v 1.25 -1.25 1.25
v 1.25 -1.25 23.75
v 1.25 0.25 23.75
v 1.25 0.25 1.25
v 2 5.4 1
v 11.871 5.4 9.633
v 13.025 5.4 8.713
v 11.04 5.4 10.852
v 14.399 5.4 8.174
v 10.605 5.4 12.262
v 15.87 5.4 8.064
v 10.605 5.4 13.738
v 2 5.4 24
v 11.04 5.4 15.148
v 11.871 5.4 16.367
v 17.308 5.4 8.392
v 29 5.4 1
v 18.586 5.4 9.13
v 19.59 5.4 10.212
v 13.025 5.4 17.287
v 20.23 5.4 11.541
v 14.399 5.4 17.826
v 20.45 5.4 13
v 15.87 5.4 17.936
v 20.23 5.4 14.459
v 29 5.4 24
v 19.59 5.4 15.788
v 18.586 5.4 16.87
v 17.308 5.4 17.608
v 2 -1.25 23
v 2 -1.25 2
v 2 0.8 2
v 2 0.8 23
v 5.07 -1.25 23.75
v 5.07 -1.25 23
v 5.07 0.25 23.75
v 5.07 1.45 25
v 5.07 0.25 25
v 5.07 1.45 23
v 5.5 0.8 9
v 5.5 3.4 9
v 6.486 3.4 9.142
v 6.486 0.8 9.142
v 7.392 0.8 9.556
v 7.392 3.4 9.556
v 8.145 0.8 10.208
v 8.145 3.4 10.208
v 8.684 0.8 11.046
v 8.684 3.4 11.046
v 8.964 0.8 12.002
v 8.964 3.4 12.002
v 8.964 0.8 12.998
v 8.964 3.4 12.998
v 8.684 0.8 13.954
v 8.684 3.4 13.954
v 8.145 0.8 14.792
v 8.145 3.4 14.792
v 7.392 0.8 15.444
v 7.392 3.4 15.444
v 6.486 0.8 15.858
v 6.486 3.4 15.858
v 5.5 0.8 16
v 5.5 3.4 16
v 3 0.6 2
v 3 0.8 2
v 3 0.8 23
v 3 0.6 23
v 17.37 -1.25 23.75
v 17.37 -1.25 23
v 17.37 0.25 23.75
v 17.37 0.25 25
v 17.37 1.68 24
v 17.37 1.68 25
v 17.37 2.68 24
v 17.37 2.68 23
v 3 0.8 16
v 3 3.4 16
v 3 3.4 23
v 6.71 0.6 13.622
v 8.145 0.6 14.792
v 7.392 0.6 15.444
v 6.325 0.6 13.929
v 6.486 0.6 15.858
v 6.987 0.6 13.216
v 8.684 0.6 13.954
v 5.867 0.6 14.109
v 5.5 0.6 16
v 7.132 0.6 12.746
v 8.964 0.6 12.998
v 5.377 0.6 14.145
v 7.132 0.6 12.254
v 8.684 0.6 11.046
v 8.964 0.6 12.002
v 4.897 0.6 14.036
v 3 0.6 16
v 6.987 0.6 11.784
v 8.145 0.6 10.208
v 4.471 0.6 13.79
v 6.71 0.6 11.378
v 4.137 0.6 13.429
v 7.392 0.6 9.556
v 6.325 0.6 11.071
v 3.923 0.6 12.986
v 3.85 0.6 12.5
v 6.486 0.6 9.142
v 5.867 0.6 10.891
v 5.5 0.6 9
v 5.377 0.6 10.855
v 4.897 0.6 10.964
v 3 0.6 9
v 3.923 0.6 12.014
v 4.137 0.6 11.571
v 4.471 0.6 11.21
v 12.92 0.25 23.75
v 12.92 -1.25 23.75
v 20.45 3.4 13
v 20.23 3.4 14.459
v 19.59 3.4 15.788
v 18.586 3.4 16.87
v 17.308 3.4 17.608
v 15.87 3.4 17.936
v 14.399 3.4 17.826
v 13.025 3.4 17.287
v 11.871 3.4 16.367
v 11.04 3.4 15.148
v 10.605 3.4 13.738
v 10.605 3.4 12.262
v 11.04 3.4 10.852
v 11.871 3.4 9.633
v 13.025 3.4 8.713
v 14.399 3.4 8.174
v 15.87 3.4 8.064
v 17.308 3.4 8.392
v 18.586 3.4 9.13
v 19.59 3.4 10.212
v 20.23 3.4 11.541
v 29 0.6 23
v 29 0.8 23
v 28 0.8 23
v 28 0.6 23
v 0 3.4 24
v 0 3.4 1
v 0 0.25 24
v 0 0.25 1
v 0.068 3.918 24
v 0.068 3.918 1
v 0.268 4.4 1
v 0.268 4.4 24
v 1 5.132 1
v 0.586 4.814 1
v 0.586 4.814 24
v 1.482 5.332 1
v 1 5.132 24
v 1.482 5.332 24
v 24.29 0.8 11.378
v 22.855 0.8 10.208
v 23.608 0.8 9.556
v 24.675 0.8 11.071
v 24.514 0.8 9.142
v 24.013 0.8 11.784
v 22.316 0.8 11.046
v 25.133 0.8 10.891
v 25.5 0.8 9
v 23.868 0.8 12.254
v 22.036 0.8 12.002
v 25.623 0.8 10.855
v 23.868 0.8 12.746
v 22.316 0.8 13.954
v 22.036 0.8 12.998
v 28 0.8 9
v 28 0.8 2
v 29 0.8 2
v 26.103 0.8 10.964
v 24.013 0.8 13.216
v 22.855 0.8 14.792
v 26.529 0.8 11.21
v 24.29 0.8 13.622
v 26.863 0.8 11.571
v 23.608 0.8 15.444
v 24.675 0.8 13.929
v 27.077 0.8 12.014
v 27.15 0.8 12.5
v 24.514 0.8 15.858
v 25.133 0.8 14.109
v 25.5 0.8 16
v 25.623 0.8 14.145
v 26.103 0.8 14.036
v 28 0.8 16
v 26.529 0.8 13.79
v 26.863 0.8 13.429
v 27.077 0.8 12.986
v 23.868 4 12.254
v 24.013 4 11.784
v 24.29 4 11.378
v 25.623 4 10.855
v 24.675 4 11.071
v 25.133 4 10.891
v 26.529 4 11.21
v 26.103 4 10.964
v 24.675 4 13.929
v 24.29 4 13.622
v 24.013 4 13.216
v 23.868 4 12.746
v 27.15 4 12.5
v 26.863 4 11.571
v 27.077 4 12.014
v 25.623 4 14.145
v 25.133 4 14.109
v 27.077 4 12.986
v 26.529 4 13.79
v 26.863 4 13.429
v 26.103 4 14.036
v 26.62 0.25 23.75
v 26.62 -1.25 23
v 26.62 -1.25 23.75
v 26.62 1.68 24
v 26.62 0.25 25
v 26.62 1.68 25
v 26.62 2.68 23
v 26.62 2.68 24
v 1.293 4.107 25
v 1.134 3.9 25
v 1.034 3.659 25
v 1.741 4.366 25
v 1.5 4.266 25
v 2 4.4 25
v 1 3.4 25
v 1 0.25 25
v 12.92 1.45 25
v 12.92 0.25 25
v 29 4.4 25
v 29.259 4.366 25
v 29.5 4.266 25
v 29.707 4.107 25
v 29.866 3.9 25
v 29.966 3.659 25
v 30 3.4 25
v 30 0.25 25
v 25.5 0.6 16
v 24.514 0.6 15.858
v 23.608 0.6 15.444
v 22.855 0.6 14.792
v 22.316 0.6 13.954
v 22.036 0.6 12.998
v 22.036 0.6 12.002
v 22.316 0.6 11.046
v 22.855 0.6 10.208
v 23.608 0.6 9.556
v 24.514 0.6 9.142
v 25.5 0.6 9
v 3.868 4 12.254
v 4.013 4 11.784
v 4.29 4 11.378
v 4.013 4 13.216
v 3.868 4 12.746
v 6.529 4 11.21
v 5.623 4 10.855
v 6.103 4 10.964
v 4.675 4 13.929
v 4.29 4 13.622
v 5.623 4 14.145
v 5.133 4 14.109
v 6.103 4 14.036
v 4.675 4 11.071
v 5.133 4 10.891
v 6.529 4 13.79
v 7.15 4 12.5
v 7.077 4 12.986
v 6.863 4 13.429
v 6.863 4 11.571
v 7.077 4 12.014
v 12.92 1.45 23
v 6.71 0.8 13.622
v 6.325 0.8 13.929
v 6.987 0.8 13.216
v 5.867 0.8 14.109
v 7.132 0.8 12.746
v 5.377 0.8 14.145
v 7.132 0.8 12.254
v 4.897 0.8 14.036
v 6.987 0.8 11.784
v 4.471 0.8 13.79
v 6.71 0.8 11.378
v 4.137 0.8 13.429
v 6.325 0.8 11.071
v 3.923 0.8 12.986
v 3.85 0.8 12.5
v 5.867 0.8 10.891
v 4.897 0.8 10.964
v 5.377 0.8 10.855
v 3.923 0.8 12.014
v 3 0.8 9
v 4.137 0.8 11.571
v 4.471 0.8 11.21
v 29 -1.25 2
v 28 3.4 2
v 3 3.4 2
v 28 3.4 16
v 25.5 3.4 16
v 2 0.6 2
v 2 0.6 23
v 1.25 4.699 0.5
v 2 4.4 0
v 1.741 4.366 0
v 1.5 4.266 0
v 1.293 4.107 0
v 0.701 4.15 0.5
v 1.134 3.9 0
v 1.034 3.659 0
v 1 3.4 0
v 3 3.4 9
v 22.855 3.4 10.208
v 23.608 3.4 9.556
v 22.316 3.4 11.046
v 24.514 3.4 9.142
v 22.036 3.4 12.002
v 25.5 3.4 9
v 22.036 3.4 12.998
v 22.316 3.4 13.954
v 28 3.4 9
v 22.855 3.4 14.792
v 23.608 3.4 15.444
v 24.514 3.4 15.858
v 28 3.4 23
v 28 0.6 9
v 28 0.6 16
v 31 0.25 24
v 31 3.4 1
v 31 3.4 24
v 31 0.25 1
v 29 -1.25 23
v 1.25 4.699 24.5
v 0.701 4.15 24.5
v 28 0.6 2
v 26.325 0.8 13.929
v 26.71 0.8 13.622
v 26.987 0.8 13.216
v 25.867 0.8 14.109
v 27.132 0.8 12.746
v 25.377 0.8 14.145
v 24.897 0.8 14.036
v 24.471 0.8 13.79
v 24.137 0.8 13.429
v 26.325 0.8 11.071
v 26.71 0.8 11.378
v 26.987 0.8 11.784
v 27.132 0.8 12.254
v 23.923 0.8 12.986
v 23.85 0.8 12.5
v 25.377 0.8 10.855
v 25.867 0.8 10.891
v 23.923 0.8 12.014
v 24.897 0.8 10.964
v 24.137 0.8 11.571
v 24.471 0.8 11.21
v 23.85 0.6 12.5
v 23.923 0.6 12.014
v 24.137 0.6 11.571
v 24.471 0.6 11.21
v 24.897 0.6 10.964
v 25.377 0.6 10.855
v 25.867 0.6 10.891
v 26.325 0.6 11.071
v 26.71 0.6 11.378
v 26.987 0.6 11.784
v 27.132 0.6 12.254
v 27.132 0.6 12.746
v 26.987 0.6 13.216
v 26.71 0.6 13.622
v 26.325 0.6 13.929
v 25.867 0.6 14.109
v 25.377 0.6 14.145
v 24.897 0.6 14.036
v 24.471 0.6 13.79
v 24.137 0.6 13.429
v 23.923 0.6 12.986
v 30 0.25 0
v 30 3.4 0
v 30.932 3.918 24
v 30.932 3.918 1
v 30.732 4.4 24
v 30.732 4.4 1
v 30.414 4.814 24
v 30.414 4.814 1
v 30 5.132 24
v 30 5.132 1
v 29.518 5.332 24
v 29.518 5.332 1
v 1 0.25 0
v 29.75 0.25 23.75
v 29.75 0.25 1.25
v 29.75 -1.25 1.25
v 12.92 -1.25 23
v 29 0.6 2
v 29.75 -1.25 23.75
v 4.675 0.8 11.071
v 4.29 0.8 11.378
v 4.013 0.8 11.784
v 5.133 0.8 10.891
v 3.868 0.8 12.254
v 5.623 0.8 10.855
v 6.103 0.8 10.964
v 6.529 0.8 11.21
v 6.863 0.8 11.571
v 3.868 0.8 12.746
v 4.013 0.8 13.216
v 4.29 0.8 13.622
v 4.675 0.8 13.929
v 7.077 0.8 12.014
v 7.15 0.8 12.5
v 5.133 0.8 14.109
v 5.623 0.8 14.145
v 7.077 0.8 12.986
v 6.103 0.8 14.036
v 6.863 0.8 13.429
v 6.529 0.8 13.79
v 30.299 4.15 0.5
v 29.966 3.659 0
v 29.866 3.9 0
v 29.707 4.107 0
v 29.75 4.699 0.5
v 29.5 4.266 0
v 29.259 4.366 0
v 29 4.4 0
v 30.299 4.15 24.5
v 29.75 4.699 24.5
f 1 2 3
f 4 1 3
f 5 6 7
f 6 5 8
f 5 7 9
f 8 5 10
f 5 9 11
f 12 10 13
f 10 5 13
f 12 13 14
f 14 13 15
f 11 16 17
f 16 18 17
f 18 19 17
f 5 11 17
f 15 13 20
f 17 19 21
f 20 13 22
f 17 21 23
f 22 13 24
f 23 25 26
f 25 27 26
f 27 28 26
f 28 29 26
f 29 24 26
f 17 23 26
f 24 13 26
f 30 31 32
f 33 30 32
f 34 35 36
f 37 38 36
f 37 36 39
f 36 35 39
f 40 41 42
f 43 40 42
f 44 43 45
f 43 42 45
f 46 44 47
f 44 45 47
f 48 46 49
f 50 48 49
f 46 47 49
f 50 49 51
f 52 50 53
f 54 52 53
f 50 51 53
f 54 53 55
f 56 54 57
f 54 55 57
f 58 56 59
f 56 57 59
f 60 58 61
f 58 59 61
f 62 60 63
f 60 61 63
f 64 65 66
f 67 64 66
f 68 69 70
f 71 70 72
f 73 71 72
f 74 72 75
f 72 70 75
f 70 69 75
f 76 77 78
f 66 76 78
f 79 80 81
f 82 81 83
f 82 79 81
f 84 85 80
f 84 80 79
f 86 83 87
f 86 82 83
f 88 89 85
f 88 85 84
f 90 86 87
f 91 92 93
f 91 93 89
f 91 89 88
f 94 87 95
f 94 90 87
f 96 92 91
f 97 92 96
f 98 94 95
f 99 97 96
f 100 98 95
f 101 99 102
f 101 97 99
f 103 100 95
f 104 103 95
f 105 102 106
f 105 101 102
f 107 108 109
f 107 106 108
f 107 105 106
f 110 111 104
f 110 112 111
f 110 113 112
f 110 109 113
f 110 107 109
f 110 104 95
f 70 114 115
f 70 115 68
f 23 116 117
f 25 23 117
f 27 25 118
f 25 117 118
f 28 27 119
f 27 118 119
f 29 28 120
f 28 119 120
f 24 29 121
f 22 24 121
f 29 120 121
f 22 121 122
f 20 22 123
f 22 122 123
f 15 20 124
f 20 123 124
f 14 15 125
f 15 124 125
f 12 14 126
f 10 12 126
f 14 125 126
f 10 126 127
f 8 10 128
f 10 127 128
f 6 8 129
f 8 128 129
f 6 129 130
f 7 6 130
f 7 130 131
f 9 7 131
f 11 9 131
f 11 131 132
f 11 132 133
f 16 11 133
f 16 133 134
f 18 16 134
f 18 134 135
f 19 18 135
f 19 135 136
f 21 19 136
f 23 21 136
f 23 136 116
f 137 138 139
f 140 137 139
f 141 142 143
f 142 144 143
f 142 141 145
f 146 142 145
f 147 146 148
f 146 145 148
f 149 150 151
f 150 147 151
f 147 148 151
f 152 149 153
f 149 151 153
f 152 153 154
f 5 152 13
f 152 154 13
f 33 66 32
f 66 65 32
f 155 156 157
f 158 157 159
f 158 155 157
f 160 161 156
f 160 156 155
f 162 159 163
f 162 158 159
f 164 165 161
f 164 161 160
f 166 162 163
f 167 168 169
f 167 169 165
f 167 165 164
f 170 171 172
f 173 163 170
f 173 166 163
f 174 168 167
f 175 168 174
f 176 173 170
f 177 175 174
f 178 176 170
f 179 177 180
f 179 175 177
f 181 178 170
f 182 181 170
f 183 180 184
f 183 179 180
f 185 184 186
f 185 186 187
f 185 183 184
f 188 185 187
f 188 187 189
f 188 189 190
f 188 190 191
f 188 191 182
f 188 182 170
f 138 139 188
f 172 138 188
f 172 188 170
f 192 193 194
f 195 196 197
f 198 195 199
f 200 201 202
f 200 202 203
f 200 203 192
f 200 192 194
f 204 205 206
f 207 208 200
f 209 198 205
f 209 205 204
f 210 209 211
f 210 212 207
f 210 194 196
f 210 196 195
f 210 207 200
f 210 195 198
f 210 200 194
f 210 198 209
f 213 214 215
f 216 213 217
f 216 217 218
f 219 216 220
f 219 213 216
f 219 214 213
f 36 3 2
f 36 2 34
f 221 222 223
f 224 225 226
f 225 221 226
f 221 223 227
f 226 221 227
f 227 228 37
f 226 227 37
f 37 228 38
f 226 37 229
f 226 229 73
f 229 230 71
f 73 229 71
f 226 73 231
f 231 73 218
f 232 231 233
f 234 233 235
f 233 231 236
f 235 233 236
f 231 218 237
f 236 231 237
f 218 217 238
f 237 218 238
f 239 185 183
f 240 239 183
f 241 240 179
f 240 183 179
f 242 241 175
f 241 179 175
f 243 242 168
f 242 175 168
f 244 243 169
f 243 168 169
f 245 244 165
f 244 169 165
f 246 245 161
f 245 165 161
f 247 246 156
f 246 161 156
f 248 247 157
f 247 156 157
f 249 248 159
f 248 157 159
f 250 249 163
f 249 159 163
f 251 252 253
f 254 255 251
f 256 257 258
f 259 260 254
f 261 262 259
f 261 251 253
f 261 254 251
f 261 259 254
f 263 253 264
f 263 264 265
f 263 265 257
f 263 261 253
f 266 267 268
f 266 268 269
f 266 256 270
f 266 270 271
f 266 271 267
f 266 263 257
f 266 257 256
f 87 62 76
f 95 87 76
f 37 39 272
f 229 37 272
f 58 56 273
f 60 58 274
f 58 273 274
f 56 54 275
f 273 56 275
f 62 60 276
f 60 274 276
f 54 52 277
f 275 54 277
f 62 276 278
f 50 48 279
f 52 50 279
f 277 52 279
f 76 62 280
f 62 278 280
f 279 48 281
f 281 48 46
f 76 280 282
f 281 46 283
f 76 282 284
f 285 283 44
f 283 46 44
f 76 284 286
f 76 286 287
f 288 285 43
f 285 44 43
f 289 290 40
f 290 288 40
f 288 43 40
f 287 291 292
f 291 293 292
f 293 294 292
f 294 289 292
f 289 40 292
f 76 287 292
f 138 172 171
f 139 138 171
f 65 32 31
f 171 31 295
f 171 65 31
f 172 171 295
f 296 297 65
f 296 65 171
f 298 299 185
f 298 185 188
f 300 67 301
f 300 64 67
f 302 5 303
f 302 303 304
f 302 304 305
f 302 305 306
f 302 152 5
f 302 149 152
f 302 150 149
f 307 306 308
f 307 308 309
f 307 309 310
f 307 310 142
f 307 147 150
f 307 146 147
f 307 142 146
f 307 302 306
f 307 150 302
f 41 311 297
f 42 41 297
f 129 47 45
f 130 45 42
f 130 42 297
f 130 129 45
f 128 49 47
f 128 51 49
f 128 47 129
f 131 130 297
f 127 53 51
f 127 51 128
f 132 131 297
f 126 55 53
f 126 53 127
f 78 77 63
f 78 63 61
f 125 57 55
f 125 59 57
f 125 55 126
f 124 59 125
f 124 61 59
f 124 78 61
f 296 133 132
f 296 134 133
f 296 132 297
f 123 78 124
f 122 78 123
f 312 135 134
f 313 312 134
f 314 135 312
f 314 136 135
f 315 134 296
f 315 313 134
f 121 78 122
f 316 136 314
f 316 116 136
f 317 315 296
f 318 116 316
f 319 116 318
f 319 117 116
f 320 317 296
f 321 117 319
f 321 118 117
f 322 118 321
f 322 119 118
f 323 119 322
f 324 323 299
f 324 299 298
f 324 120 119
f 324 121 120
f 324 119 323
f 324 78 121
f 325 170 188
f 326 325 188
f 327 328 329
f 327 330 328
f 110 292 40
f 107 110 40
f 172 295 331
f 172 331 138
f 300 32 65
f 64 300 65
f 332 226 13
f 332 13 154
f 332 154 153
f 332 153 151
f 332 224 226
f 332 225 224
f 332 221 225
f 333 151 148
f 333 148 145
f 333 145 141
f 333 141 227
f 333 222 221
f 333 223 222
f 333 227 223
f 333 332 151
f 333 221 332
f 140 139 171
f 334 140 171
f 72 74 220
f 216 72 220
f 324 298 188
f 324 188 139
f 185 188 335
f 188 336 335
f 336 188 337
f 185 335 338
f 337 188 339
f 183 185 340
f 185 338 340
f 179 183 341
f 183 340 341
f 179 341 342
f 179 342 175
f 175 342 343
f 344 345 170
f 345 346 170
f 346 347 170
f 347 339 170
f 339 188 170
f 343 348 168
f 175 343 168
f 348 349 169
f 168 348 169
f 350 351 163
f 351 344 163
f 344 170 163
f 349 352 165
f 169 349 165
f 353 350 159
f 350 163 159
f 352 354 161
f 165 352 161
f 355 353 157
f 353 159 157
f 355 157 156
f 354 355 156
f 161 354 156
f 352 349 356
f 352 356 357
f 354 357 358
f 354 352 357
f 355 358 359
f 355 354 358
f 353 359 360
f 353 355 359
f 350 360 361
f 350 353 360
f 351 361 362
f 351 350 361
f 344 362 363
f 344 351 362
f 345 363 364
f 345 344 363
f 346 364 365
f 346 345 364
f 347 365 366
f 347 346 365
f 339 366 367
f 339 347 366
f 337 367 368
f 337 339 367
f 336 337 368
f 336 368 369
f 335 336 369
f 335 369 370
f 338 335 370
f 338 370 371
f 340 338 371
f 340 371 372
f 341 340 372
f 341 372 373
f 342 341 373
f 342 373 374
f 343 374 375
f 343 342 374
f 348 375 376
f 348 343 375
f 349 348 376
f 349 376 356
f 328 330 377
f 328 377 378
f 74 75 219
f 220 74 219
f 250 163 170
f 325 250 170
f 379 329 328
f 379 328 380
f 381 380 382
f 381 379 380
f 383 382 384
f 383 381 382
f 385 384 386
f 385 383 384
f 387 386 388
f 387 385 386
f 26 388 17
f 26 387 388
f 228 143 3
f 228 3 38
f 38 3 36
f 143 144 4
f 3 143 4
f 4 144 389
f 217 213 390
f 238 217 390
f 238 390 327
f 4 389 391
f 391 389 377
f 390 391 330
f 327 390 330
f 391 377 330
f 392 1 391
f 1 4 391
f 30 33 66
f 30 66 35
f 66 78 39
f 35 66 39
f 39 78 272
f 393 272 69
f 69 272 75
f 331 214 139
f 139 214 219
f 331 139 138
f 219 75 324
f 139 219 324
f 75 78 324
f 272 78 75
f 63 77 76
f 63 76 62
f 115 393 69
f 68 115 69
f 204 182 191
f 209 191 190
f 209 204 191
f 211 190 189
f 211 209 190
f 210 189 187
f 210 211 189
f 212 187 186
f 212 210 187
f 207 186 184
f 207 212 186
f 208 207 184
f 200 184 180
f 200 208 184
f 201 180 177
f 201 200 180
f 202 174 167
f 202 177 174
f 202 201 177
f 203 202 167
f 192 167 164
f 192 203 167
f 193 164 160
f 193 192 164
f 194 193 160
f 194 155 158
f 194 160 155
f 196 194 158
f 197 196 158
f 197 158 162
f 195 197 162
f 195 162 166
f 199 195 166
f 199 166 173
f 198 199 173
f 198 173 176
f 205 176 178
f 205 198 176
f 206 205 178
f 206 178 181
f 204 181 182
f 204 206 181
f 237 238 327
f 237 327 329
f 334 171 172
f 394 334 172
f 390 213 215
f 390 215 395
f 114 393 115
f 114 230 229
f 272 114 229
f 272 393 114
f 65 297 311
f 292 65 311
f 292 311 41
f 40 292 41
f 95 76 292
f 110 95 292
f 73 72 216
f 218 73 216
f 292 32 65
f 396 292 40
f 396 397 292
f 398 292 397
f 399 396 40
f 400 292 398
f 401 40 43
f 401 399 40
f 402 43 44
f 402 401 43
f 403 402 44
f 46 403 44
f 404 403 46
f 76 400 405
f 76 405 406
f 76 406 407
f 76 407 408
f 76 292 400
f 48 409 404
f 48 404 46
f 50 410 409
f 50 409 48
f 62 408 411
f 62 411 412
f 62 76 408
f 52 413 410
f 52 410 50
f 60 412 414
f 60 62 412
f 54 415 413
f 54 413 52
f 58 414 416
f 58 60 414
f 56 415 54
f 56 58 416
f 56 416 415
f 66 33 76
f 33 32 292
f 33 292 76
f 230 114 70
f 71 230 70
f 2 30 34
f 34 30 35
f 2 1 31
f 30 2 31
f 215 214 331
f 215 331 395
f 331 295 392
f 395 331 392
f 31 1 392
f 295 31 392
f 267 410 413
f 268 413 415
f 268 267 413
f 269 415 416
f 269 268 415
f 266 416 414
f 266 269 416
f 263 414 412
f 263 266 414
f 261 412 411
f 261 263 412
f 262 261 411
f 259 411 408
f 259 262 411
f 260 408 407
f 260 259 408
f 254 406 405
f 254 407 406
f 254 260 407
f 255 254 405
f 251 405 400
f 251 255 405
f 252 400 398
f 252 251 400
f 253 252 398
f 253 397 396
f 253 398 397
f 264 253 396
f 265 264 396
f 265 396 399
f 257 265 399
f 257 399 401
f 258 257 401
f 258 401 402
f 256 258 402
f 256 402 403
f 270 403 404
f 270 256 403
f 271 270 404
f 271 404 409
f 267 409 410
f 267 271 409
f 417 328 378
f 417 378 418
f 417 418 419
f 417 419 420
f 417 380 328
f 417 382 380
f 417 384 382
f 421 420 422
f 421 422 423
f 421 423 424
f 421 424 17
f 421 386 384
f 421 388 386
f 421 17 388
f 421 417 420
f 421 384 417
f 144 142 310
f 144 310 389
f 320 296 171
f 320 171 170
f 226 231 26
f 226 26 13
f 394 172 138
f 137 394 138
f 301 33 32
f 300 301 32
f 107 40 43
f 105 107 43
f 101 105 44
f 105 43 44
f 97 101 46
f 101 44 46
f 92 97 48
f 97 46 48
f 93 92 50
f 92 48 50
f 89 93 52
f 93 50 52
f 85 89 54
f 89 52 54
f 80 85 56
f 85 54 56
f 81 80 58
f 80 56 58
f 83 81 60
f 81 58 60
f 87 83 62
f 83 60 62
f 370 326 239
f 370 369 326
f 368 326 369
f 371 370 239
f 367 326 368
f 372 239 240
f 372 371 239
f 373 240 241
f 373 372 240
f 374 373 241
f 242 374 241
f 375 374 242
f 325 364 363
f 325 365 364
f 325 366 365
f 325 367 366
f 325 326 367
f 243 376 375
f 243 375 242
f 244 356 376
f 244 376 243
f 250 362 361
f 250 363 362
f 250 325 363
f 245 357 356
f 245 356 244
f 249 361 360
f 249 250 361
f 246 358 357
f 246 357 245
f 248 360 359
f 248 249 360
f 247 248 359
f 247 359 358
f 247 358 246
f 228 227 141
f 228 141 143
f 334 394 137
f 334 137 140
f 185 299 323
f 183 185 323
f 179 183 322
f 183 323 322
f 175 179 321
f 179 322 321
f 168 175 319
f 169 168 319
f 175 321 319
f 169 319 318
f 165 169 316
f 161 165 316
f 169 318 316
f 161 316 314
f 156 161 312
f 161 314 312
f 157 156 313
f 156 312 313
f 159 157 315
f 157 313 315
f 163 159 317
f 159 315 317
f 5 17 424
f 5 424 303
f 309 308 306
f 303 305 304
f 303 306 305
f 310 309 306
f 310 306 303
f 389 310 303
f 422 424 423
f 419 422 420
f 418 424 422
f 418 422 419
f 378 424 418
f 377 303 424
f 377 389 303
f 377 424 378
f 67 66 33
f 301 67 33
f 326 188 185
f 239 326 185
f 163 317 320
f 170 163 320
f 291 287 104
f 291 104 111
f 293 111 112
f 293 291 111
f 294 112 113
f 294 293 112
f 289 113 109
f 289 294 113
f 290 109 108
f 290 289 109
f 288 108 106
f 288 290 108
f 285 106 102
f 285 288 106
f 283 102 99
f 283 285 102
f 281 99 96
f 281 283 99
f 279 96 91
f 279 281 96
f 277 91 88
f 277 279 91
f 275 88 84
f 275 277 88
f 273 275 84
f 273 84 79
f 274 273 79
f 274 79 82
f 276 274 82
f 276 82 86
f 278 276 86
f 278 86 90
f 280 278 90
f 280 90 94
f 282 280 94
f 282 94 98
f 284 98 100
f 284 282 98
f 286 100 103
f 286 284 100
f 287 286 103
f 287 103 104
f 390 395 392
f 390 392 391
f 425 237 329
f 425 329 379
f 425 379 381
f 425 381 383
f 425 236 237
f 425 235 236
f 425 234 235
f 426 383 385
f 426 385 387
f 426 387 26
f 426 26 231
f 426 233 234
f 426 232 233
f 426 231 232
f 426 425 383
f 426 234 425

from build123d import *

# Parameters (mm, degrees)
BOX_W              = 9.25
BOX_H              = 1
BOX_DEPTH          = 1
BOX007_W           = 7.85
BOX007_H           = 2.1
BOX007_DEPTH       = 10
BOX006_W           = 7.85
BOX006_H           = 2.1
BOX006_DEPTH       = 10
BOX008_W           = 9.25
BOX008_H           = 2.55
BOX008_DEPTH       = 10
BOX005_W           = 9.25
BOX005_H           = 2.55
BOX005_DEPTH       = 10
BOX004_W           = 28.5
BOX004_H           = 0.25
BOX004_DEPTH       = 22.5
BOX003_W           = 31
BOX003_H           = 0.25
BOX003_DEPTH       = 25
BOX002_W           = 27
BOX002_H           = 1.25
BOX002_DEPTH       = 21
BOX001_W           = 28.5
BOX001_H           = 1.25
BOX001_DEPTH       = 22.5
CYLINDER_R         = 1.65
CYLINDER_DEPTH     = 3.4
CYLINDER001_R      = 1.65
CYLINDER001_DEPTH  = 3.4
SKETCH_W           = 31
SKETCH_H           = 25
PAD_DEPTH          = 5.4
SKETCH003_W        = 27
SKETCH003_H        = 21
POCKET_DEPTH       = 3.4
SKETCH001_W        = 1
SKETCH001_H        = 21
PAD001_DEPTH       = 2.6
PAD002_DEPTH       = 2.6
SKETCH004_R        = 4.95
POCKET001_DEPTH    = 11
FILLET001_R        = 2
CHAMFER_SIZE       = 1
FACE_R             = 1.65
EXTRUSION_DEPTH    = 0.2
EXTRUSION001_DEPTH = 0.2
FACE004_R          = 1.65
EXTRUSION002_DEPTH = 0.2
EXTRUSION003_DEPTH = 0.2


with BuildPart() as typec_extra_space:
    # Box → Box (new body)
    with BuildSketch(Plane(origin=(17.37, 1.68, 23), x_dir=(1, 0, 0), z_dir=(0, 0, 1))):
        with Locations((4.625, 0.5)):
            Rectangle(BOX_W, BOX_H)
    extrude(amount=BOX_DEPTH)


with BuildPart() as micro_cutout_upper:
    # Box007 → Box007 (new body)
    with BuildSketch(Plane(origin=(5.07, -1.65, 20), x_dir=(1, 0, 0), z_dir=(0, 0, 1))):
        with Locations((3.925, 1.05)):
            Rectangle(BOX007_W, BOX007_H)
    extrude(amount=BOX007_DEPTH)


with BuildPart() as fusion003:
    # Box006 → Box006 (new body)
    with BuildSketch(Plane(origin=(5.07, -0.65, 20), x_dir=(1, 0, 0), z_dir=(0, 0, 1))):
        with Locations((3.925, 1.05)):
            Rectangle(BOX006_W, BOX006_H)
    extrude(amount=BOX006_DEPTH)

    # Fusion003: union Micro_cutout_upper
    add(micro_cutout_upper.part)


with BuildPart() as typec_cutout_upper:
    # Box008 → Box008 (new body)
    with BuildSketch(Plane(origin=(17.37, -1.87, 20), x_dir=(1, 0, 0), z_dir=(0, 0, 1))):
        with Locations((4.625, 1.275)):
            Rectangle(BOX008_W, BOX008_H)
    extrude(amount=BOX008_DEPTH)


with BuildPart() as fusion002:
    # Box005 → Box005 (new body)
    with BuildSketch(Plane(origin=(17.37, -0.87, 20), x_dir=(1, 0, 0), z_dir=(0, 0, 1))):
        with Locations((4.625, 1.275)):
            Rectangle(BOX005_W, BOX005_H)
    extrude(amount=BOX005_DEPTH)

    # Fusion002: union TypeC_cutout_upper
    add(typec_cutout_upper.part)


with BuildPart() as cube004:
    # Box004 → Box004 (new body)
    with BuildSketch(Plane(origin=(1.25, 0, 1.25), x_dir=(1, 0, 0), z_dir=(0, 0, 1))):
        with Locations((14.25, 0.125)):
            Rectangle(BOX004_W, BOX004_H)
    extrude(amount=BOX004_DEPTH)


with BuildPart() as cut002:
    # Box003 → Box003 (new body)
    with BuildSketch(Plane.XY):
        with Locations((15.5, 0.125)):
            Rectangle(BOX003_W, BOX003_H)
    extrude(amount=BOX003_DEPTH)

    # Cut002: cut Cube004
    add(cube004.part, mode=Mode.SUBTRACT)


with BuildPart() as cube002:
    # Box002 → Box002 (new body)
    with BuildSketch(Plane(origin=(2, 0, 2), x_dir=(1, 0, 0), z_dir=(0, 0, 1))):
        with Locations((13.5, 0.625)):
            Rectangle(BOX002_W, BOX002_H)
    extrude(amount=BOX002_DEPTH)


with BuildPart() as latch:
    # Box001 → Box001 (new body)
    with BuildSketch(Plane(origin=(1.25, 0, 1.25), x_dir=(1, 0, 0), z_dir=(0, 0, 1))):
        with Locations((14.25, 0.625)):
            Rectangle(BOX001_W, BOX001_H)
    extrude(amount=BOX001_DEPTH)

    # Cut001: cut Cube002
    add(cube002.part, mode=Mode.SUBTRACT)


with BuildPart() as latch_1:
    # Cut001 placement: moved
    add(latch.part.moved(Location((0, -1.25, 0))))


with BuildPart() as leftscrewhole:
    # Cylinder → Cylinder (new body)
    with BuildSketch(Plane(origin=(25.5, 4, 13), x_dir=(1, 0, 0), z_dir=(0, -1, 0))):
        Circle(CYLINDER_R)
    extrude(amount=CYLINDER_DEPTH)


with BuildPart() as screwholecutout:
    # Cylinder001 → Cylinder001 (new body)
    with BuildSketch(Plane(origin=(5.5, 4, 13), x_dir=(1, 0, 0), z_dir=(0, -1, 0))):
        Circle(CYLINDER001_R)
    extrude(amount=CYLINDER001_DEPTH)

    # Fusion001: union leftScrewHole
    add(leftscrewhole.part)


with BuildPart() as screwholecutout_1:
    # Fusion001 placement: moved
    add(screwholecutout.part.moved(Location((0, 0, -0.5))))


with BuildPart() as cut006:
    # Sketch → Pad (new body)
    with BuildSketch(Plane.XZ):
        with Locations((15.5, 12.5)):
            Rectangle(SKETCH_W, SKETCH_H)
    extrude(amount=-PAD_DEPTH)

    # Sketch003 → Pocket (cut)
    with BuildSketch(Plane.XZ):
        with Locations((15.5, 12.5)):
            Rectangle(SKETCH003_W, SKETCH003_H)
    extrude(amount=-POCKET_DEPTH, mode=Mode.SUBTRACT)

    # Sketch001 → Pad001 (join)
    with BuildSketch(Plane.XZ.offset(-3.4)):
        with Locations((28.5, 12.5)):
            Rectangle(SKETCH001_W, SKETCH001_H)
        with Locations((2.5, 12.5)):
            Rectangle(SKETCH001_W, SKETCH001_H)
    extrude(amount=PAD001_DEPTH)

    # Sketch002 → Pad002 (join)
    with BuildSketch(Plane.XZ.offset(-3.4)):
        with BuildLine():
            Line((3, 16), (5.5, 16))
            ThreePointArc((5.5, 9), (9, 12.5), (5.5, 16))
            Line((3, 9), (5.5, 9))
            Line((3, 16), (3, 9))
        make_face()
        with BuildLine():
            Line((25.5, 16), (28, 16))
            Line((28, 16), (28, 9))
            Line((25.5, 9), (28, 9))
            ThreePointArc((25.5, 16), (22, 12.5), (25.5, 9))
        make_face()
    extrude(amount=PAD002_DEPTH)

    # Sketch004 → Pocket001 (cut)
    with BuildSketch(Plane.XZ):
        with Locations((15.5, 13)):
            Circle(SKETCH004_R)
    extrude(amount=-POCKET001_DEPTH, mode=Mode.SUBTRACT)

    # Cut: cut screwHoleCutout
    add(screwholecutout_1.part, mode=Mode.SUBTRACT)

    # Fusion: union latch
    add(latch_1.part)

    # Cut003: cut Cut002
    add(cut002.part, mode=Mode.SUBTRACT)

    # Cut004: cut Fusion002
    add(fusion002.part, mode=Mode.SUBTRACT)

    # Cut005: cut Fusion003
    add(fusion003.part, mode=Mode.SUBTRACT)

    # Fillet001
    fillet001_edges = [cut006.edges().sort_by_distance(p)[0] for p in [
        (31, 5.4, 12.5),
        (0, 5.4, 12.5),
    ]]
    fillet(fillet001_edges, radius=FILLET001_R)

    # Chamfer
    chamfer_edges = [cut006.edges().sort_by_distance(p)[0] for p in [
        (31, 1.825, 0),
        (30.414214, 4.814214, 0),
        (15.5, 5.4, 0),
        (0, 1.825, 0),
        (0.585786, 4.814214, 0),
        (31, 1.825, 25),
        (30.414214, 4.814214, 25),
        (15.5, 5.4, 25),
        (0, 1.825, 25),
        (0.585786, 4.814214, 25),
    ]]
    chamfer(chamfer_edges, length=CHAMFER_SIZE)

    # Cut006: cut TypeC_extra_space
    add(typec_extra_space.part, mode=Mode.SUBTRACT)


with BuildPart() as extrusion:
    # Face → Extrusion (new body)
    with BuildSketch(Plane(origin=(5.737975, 0.8, 12.5), x_dir=(-1, 0, 0), z_dir=(0, -1, 0))):
        with BuildLine():
            Line((2.737975, -3.5), (2.737975, 3.5))
            Line((2.737975, 3.5), (0.237975, 3.5))
            ThreePointArc((0.237975, 3.5), (-3.262025, 0), (0.237975, -3.5))
            Line((0.237975, -3.5), (2.737975, -3.5))
        make_face()
        with Locations((0.237975, 0)):
            Circle(FACE_R, mode=Mode.SUBTRACT)
    extrude(amount=EXTRUSION_DEPTH)


with BuildPart() as extrusion001:
    # Face001 → Extrusion001 (new body)
    with BuildSketch(Plane(origin=(2.5, 0.8, 12.5), x_dir=(-1, 0, 0), z_dir=(0, -1, 0))):
        Polygon((-0.5, -10.5), (0.5, -10.5), (0.5, 10.5), (-0.5, 10.5), (-0.5, 3.5), (-0.5, -3.5), align=None)
    extrude(amount=EXTRUSION001_DEPTH)


with BuildPart() as extrusion002:
    # Face004 → Extrusion002 (new body)
    with BuildSketch(Plane(origin=(25.262025, 0.8, 12.5), x_dir=(-1, 0, 0), z_dir=(0, -1, 0))):
        with BuildLine():
            Line((-2.737975, -3.5), (-0.237975, -3.5))
            ThreePointArc((-0.237975, -3.5), (3.262025, 0), (-0.237975, 3.5))
            Line((-0.237975, 3.5), (-2.737975, 3.5))
            Line((-2.737975, 3.5), (-2.737975, -3.5))
        make_face()
        with Locations((-0.237975, 0)):
            Circle(FACE004_R, mode=Mode.SUBTRACT)
    extrude(amount=EXTRUSION002_DEPTH)


with BuildPart() as extrusion003:
    # Face005 → Extrusion003 (new body)
    with BuildSketch(Plane(origin=(28.5, 0.8, 12.5), x_dir=(-1, 0, 0), z_dir=(0, -1, 0))):
        Polygon((-0.5, 10.5), (-0.5, -10.5), (0.5, -10.5), (0.5, -3.5), (0.5, 3.5), (0.5, 10.5), align=None)
    extrude(amount=EXTRUSION003_DEPTH)


solid = Compound([cut006.part, extrusion.part, extrusion001.part, extrusion002.part, extrusion003.part])
